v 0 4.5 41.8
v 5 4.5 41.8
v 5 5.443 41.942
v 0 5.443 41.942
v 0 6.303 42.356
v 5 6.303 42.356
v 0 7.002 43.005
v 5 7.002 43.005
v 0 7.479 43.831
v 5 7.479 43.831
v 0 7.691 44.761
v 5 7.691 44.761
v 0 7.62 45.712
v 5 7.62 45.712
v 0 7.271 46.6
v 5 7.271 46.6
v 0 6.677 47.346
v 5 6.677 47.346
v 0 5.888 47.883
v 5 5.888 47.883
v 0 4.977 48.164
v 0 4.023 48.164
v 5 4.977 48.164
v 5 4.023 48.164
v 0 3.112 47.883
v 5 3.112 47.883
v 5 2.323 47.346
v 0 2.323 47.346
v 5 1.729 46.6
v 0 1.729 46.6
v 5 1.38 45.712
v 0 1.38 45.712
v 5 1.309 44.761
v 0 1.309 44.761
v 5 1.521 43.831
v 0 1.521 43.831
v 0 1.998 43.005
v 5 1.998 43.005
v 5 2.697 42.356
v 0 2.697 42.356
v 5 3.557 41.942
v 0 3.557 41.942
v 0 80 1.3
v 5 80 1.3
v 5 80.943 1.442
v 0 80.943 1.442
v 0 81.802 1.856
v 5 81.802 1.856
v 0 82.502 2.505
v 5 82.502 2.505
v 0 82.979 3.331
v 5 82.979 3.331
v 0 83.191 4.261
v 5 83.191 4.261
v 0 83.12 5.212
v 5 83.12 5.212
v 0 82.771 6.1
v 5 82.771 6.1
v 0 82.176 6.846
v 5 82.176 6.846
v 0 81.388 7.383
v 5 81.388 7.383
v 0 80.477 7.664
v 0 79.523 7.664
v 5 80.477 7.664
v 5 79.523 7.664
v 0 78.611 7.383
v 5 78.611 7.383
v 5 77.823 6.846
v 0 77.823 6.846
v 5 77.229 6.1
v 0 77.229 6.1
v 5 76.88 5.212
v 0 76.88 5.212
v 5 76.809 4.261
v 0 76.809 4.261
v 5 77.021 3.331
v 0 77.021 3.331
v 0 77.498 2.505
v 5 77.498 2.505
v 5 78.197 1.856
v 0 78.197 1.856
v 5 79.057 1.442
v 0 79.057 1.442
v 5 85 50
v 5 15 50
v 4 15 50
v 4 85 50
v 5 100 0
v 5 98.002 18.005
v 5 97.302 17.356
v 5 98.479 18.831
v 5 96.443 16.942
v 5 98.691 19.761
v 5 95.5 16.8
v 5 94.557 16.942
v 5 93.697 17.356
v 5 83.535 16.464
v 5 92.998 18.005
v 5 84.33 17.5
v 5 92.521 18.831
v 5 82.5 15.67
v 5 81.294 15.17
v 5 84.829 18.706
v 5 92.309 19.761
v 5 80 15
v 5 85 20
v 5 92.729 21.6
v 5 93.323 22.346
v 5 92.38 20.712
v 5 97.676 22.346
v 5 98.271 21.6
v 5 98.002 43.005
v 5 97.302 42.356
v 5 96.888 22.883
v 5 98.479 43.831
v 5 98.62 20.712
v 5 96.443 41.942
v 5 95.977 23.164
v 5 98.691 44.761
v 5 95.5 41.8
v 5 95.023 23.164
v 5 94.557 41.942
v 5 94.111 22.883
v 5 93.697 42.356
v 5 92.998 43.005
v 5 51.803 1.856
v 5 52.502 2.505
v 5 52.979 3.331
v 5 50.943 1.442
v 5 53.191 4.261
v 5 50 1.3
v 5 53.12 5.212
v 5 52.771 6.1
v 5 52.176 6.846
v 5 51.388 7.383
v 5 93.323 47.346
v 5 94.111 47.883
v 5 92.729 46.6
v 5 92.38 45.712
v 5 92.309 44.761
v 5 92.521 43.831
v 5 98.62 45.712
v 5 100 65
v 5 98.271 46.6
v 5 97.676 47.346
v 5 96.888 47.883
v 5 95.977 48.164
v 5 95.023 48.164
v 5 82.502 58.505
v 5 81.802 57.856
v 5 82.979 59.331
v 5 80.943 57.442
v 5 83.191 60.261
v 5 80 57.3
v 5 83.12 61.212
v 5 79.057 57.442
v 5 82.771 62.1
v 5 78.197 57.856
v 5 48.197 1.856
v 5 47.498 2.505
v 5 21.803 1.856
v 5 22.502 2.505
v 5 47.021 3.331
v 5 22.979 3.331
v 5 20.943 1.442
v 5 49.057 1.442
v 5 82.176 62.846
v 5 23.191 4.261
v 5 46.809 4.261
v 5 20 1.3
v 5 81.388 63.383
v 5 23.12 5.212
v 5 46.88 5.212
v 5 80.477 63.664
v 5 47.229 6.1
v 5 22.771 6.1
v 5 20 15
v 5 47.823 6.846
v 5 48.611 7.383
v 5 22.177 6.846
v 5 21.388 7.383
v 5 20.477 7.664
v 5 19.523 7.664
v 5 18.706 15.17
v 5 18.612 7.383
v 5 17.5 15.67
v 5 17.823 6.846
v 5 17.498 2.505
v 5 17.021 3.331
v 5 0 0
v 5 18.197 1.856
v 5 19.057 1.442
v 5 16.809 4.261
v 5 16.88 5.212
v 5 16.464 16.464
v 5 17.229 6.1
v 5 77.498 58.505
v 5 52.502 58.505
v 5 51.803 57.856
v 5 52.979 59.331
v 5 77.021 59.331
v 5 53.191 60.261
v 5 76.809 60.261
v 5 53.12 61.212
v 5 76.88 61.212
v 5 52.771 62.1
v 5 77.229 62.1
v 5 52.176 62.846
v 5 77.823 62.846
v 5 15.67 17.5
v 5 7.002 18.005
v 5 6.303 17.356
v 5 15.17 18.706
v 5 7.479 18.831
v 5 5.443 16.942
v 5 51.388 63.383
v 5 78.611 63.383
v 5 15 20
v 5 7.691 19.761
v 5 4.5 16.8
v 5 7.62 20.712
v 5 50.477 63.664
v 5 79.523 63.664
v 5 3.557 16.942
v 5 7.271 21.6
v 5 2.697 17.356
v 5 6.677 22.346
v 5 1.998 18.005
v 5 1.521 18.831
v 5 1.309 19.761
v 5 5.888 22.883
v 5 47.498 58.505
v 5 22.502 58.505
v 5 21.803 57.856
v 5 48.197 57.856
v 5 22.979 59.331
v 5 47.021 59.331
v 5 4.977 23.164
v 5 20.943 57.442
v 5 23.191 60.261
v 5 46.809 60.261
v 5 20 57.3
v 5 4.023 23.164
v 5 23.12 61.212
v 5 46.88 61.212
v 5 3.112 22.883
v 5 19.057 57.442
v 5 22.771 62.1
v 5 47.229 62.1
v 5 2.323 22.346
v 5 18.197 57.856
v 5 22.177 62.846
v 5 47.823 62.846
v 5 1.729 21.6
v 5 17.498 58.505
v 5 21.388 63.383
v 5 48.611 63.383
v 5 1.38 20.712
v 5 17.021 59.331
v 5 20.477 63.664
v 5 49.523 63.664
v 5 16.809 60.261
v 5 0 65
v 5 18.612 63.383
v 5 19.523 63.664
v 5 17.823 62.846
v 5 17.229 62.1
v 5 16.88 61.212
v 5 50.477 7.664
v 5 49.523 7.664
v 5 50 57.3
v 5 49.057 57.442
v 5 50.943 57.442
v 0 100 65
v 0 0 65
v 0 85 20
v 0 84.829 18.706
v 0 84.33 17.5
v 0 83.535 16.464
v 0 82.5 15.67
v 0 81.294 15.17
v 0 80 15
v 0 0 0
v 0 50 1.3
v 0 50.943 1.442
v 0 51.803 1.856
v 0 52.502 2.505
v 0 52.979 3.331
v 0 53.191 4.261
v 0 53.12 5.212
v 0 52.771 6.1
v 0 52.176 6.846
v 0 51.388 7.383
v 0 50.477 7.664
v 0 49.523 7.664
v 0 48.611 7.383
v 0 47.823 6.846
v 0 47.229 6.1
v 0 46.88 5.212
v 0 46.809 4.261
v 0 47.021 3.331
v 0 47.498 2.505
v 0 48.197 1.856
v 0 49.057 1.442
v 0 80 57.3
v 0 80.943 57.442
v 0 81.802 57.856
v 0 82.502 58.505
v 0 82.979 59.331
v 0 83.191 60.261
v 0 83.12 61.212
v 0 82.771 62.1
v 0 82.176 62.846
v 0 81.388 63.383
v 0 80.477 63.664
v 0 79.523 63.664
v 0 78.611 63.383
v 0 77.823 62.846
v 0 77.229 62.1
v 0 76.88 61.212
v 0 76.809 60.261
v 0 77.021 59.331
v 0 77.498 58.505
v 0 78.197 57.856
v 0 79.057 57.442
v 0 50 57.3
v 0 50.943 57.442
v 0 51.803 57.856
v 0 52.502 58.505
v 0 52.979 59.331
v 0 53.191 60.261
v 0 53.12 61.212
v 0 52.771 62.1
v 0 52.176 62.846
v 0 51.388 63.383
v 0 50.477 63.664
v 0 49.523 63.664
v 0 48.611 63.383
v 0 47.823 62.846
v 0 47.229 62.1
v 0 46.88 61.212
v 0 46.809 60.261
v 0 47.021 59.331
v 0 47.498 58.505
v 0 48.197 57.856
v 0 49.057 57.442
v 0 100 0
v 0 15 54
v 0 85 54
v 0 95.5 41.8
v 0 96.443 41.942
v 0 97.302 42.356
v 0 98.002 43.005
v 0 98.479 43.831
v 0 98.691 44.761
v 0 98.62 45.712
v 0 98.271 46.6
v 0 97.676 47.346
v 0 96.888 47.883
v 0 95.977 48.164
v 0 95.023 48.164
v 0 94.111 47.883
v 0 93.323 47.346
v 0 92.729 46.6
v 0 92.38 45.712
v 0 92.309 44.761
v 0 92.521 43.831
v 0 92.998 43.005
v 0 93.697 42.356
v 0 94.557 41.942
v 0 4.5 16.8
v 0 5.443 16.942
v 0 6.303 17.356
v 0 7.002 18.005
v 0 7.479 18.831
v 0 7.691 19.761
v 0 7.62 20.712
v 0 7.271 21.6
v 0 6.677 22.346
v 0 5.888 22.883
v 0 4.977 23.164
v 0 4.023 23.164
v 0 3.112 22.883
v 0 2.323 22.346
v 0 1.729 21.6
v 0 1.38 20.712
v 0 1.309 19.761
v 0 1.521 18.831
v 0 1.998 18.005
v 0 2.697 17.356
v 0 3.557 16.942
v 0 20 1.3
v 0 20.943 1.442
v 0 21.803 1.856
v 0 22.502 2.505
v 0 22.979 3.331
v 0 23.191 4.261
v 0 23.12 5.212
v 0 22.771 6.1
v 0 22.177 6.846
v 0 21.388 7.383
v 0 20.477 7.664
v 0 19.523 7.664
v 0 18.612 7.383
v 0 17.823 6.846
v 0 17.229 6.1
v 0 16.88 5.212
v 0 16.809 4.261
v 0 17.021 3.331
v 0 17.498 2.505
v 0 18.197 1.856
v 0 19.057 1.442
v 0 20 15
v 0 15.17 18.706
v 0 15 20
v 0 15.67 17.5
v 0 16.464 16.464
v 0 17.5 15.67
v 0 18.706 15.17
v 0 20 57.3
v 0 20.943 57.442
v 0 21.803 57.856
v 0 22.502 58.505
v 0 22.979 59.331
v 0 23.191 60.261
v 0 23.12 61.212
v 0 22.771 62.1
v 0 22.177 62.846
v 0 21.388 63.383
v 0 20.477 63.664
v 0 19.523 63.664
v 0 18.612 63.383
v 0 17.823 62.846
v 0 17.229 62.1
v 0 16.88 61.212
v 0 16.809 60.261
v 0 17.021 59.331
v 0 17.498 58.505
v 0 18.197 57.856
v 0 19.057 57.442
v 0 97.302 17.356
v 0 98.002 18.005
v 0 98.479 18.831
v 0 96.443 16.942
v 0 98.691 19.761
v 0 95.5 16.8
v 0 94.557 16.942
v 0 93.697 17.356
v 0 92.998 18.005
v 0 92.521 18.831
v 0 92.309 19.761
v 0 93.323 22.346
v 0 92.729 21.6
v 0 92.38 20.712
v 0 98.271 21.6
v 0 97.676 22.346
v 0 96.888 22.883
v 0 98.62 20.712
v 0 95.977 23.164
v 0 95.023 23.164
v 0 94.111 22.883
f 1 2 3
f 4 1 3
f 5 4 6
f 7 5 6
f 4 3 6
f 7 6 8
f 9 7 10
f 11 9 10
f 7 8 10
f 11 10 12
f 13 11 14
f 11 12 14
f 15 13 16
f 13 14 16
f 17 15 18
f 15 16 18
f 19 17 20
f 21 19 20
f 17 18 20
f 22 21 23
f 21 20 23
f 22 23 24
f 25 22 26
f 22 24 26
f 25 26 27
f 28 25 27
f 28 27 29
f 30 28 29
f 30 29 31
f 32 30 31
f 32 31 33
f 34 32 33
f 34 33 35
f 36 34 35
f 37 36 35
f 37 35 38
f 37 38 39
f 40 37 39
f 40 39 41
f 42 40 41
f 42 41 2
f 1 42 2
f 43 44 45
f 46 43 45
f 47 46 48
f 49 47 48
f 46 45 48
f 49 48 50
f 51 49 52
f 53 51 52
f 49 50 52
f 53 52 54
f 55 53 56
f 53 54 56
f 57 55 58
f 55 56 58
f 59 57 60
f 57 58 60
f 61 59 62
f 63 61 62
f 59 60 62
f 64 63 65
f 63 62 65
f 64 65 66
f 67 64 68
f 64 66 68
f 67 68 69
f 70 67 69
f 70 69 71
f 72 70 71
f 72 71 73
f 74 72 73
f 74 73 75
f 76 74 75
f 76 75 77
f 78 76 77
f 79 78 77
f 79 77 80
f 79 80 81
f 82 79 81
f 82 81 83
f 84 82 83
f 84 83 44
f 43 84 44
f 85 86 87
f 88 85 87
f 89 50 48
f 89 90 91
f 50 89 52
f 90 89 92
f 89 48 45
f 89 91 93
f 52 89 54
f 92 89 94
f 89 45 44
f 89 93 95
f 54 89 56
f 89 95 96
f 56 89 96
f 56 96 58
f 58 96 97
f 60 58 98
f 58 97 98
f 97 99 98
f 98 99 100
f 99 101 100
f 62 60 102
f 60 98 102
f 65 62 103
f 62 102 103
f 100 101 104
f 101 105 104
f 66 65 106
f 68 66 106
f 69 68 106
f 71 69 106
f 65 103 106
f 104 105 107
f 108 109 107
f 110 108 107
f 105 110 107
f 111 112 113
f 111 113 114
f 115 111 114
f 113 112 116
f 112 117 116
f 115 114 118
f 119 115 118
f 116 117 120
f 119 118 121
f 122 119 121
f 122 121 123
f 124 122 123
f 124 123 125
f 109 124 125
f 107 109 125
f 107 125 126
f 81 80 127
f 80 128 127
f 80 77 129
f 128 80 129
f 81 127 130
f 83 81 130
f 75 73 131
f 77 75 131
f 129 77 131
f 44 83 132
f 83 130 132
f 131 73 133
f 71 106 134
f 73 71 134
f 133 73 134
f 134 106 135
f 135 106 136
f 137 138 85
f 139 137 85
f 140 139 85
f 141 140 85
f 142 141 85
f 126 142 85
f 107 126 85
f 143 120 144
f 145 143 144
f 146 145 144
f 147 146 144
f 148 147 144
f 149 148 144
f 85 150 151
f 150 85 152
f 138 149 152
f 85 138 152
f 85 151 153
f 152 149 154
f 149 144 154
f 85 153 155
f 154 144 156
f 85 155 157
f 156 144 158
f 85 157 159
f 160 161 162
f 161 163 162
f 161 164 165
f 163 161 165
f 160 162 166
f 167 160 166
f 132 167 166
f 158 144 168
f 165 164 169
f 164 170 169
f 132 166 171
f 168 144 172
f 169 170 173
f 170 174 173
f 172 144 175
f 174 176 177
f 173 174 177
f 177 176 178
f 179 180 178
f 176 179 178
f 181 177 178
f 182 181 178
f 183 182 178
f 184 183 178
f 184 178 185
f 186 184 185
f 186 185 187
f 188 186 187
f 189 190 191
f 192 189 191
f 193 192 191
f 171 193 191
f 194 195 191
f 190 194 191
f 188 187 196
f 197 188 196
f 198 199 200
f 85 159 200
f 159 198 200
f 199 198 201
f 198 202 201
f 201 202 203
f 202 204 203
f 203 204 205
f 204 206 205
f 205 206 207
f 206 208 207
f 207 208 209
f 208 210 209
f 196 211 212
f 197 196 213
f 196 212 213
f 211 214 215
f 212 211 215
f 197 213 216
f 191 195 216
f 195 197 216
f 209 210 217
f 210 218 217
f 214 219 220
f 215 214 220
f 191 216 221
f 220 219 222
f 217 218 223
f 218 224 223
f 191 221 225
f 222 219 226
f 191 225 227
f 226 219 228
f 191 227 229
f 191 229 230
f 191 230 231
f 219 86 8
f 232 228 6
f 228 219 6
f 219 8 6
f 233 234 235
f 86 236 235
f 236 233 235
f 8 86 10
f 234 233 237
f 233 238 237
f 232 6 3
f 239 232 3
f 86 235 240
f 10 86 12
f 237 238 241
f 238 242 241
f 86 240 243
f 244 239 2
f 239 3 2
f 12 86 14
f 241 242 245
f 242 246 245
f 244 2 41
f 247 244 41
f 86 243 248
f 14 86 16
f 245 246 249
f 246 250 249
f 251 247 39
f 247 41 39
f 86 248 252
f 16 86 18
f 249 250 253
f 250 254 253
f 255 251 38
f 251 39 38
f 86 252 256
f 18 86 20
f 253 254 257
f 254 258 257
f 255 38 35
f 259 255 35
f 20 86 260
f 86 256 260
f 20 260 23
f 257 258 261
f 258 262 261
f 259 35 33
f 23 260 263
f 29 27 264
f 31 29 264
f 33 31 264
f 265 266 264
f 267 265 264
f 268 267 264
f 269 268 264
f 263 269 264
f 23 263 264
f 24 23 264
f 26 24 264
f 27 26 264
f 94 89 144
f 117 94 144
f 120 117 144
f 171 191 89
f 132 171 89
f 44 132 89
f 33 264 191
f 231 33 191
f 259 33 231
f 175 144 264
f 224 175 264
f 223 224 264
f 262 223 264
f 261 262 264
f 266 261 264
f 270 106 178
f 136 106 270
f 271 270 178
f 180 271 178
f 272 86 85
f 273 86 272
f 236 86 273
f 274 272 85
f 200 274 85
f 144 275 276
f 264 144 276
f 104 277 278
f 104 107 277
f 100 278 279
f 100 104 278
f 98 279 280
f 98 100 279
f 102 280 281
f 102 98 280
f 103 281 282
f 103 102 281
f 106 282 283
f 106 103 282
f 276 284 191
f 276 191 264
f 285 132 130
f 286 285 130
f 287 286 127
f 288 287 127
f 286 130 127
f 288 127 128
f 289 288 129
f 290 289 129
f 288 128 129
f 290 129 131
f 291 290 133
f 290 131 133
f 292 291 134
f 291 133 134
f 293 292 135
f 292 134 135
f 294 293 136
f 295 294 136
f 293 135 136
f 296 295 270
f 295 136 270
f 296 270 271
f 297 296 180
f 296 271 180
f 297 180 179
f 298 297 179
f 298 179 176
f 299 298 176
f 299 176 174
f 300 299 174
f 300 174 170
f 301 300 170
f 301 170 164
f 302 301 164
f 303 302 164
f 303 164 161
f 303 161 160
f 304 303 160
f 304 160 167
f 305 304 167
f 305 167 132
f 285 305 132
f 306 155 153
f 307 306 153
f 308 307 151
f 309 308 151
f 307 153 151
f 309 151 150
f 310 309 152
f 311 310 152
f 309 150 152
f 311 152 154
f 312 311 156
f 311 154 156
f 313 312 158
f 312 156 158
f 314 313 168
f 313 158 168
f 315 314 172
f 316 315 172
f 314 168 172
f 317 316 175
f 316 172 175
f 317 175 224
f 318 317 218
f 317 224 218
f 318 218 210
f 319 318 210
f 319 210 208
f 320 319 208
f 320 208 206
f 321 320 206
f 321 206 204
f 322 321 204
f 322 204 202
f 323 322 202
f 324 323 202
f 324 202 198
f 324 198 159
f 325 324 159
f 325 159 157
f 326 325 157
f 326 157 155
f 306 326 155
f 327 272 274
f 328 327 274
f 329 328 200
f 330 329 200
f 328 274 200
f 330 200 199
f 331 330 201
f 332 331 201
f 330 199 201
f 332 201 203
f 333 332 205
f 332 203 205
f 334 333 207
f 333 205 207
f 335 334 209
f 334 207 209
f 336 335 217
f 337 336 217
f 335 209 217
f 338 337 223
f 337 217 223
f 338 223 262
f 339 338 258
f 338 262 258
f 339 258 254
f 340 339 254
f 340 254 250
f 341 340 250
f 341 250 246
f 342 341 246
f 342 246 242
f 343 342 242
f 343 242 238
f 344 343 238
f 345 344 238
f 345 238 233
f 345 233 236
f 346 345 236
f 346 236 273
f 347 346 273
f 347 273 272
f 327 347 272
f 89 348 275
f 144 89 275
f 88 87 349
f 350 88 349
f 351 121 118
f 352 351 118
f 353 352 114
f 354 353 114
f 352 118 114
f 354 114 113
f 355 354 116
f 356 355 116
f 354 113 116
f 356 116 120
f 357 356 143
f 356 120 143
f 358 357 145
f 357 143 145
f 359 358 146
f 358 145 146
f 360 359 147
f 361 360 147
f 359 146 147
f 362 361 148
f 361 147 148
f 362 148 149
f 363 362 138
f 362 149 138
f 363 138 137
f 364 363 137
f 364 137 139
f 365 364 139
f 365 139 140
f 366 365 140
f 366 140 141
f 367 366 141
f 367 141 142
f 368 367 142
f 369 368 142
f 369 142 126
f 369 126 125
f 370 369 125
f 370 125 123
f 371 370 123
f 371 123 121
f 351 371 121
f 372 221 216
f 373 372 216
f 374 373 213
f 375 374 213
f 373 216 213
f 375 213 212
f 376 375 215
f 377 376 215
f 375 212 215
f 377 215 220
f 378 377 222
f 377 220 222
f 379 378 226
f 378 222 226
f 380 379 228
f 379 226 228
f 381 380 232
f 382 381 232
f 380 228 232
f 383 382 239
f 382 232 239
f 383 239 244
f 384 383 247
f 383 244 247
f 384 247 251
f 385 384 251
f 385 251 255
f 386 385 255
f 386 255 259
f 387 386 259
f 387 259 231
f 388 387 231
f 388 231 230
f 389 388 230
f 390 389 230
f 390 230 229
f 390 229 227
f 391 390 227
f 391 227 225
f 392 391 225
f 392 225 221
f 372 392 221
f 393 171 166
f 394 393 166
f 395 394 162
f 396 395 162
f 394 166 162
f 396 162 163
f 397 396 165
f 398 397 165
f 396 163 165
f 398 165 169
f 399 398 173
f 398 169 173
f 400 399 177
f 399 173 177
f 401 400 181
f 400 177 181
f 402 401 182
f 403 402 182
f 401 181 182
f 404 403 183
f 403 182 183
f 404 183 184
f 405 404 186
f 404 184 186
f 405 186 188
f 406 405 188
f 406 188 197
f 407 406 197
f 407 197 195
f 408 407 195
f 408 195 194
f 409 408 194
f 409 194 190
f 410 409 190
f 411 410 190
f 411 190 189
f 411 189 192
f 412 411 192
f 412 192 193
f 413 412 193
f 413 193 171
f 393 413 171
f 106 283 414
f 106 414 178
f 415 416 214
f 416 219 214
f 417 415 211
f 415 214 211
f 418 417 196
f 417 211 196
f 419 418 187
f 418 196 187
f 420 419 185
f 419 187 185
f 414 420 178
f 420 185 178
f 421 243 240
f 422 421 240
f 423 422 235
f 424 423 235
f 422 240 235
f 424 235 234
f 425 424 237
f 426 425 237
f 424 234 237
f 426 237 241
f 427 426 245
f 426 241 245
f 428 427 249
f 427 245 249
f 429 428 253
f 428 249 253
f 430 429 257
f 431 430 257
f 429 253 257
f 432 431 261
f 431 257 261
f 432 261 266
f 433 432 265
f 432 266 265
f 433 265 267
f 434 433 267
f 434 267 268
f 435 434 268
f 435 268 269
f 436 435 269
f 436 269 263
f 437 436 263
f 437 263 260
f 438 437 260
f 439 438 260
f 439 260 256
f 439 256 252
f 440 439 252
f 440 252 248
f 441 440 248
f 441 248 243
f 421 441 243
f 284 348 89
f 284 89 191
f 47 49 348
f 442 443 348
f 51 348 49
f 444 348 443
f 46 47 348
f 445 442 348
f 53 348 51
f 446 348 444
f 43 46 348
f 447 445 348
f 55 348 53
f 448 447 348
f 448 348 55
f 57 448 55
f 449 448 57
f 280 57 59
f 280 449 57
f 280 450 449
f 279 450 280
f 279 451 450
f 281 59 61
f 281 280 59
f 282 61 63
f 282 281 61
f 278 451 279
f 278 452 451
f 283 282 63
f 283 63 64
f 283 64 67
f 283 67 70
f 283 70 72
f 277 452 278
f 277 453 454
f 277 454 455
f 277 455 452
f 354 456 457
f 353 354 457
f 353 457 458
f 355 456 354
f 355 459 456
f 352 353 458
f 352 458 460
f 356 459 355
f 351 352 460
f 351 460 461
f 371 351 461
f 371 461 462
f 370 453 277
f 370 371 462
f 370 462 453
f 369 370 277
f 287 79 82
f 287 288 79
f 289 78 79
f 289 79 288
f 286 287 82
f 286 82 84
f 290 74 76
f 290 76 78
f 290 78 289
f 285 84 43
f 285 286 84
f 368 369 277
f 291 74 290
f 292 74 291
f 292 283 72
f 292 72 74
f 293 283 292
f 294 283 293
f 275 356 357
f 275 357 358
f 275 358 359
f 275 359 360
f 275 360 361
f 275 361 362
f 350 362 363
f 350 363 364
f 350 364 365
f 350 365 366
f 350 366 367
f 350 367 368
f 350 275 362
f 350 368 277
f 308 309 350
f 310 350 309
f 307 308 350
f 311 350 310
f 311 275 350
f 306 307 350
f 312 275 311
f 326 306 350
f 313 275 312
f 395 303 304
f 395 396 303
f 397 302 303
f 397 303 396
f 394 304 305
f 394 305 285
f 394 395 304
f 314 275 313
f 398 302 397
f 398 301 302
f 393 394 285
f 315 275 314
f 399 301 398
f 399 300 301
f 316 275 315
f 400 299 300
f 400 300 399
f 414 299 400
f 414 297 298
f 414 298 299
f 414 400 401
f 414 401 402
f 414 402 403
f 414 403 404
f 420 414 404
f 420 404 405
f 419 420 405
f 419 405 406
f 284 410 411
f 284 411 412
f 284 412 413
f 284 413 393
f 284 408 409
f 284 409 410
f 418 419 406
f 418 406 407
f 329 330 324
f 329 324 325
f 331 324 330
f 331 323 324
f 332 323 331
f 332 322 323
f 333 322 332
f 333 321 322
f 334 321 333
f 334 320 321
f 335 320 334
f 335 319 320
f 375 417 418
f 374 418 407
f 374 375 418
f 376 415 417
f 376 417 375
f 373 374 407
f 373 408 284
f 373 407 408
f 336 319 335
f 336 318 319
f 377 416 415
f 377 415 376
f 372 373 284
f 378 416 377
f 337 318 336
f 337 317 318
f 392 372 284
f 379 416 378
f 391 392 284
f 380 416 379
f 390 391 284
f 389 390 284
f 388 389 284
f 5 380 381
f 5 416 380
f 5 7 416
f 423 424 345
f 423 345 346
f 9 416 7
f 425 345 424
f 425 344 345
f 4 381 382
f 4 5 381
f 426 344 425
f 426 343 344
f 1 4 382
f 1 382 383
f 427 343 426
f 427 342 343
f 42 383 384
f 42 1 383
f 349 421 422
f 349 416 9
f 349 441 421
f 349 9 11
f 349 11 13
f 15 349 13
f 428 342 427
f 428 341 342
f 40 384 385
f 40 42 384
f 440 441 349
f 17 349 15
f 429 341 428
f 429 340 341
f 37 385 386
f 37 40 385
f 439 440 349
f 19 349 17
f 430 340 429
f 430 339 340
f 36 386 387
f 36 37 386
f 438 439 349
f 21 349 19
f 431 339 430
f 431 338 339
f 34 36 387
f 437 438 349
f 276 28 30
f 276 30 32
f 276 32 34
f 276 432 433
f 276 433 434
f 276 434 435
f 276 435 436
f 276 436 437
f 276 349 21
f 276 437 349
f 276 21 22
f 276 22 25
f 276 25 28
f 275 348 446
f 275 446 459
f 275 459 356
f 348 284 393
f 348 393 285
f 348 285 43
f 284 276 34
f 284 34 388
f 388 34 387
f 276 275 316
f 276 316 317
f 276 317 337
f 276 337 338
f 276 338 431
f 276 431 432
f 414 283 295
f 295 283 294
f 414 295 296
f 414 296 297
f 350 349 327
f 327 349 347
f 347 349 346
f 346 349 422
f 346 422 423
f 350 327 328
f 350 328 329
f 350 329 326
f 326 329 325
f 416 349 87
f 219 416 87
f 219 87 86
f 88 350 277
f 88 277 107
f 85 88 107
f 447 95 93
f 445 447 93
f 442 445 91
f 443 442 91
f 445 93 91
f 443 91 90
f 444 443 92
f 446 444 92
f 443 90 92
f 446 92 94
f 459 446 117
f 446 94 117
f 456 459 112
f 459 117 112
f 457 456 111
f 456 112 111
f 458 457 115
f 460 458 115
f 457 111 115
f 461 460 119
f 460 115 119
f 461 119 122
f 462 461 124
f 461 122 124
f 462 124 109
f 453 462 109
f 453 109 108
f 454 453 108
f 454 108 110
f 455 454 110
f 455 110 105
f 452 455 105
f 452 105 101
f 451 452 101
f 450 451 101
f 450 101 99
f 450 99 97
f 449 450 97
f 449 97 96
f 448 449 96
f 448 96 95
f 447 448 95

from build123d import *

# Parameters (mm, degrees)
SKETCH1_W           = 99.9998
SKETCH1_H           = 64.99987
BOSS_EXTRUDE1_DEPTH = 4.99999
CUT_EXTRUDE1_DEPTH  = 69.99986
HOLE1_D             = 6.3999872
FILLET1_R           = 4.99999


with BuildPart() as part:
    # Sketch1 → Boss-Extrude1 (new body)
    with BuildSketch(Plane(origin=(0, 0, 0), x_dir=(0, -1, 0), z_dir=(-1, 0, 0))):
        with Locations((-49.9999, 32.499935)):
            Rectangle(SKETCH1_W, SKETCH1_H)
    extrude(amount=-BOSS_EXTRUDE1_DEPTH)

    # Sketch2 → Cut-Extrude1 (cut)
    with BuildSketch(Plane.XZ.offset(-14.99997)):
        Polygon((0, 53.999892), (0, 14.99997), (4.99999, 14.99997), (4.99999, 49.9999), (3.999992, 49.9999), align=None)
    extrude(amount=-CUT_EXTRUDE1_DEPTH, mode=Mode.SUBTRACT)

    # Hole1 (through all)
    with Locations(Plane.ZY):
        with Locations((60.499879, 19.99996), (44.99991, 4.499991), (19.99996, 4.499991), (4.499991, 19.99996), (4.499991, 49.9999), (4.499991, 79.99984), (19.99996, 95.499809), (44.99991, 95.499809), (60.499879, 79.99984), (60.499879, 49.9999)):
            Hole(HOLE1_D / 2)

    # Fillet1
    fillet1_edges = [part.edges().sort_by_distance(p)[0] for p in [
        (2.499995, 84.99983, 14.99997),
        (2.499995, 14.99997, 14.99997),
    ]]
    fillet(fillet1_edges, radius=FILLET1_R)


solid = part.part
